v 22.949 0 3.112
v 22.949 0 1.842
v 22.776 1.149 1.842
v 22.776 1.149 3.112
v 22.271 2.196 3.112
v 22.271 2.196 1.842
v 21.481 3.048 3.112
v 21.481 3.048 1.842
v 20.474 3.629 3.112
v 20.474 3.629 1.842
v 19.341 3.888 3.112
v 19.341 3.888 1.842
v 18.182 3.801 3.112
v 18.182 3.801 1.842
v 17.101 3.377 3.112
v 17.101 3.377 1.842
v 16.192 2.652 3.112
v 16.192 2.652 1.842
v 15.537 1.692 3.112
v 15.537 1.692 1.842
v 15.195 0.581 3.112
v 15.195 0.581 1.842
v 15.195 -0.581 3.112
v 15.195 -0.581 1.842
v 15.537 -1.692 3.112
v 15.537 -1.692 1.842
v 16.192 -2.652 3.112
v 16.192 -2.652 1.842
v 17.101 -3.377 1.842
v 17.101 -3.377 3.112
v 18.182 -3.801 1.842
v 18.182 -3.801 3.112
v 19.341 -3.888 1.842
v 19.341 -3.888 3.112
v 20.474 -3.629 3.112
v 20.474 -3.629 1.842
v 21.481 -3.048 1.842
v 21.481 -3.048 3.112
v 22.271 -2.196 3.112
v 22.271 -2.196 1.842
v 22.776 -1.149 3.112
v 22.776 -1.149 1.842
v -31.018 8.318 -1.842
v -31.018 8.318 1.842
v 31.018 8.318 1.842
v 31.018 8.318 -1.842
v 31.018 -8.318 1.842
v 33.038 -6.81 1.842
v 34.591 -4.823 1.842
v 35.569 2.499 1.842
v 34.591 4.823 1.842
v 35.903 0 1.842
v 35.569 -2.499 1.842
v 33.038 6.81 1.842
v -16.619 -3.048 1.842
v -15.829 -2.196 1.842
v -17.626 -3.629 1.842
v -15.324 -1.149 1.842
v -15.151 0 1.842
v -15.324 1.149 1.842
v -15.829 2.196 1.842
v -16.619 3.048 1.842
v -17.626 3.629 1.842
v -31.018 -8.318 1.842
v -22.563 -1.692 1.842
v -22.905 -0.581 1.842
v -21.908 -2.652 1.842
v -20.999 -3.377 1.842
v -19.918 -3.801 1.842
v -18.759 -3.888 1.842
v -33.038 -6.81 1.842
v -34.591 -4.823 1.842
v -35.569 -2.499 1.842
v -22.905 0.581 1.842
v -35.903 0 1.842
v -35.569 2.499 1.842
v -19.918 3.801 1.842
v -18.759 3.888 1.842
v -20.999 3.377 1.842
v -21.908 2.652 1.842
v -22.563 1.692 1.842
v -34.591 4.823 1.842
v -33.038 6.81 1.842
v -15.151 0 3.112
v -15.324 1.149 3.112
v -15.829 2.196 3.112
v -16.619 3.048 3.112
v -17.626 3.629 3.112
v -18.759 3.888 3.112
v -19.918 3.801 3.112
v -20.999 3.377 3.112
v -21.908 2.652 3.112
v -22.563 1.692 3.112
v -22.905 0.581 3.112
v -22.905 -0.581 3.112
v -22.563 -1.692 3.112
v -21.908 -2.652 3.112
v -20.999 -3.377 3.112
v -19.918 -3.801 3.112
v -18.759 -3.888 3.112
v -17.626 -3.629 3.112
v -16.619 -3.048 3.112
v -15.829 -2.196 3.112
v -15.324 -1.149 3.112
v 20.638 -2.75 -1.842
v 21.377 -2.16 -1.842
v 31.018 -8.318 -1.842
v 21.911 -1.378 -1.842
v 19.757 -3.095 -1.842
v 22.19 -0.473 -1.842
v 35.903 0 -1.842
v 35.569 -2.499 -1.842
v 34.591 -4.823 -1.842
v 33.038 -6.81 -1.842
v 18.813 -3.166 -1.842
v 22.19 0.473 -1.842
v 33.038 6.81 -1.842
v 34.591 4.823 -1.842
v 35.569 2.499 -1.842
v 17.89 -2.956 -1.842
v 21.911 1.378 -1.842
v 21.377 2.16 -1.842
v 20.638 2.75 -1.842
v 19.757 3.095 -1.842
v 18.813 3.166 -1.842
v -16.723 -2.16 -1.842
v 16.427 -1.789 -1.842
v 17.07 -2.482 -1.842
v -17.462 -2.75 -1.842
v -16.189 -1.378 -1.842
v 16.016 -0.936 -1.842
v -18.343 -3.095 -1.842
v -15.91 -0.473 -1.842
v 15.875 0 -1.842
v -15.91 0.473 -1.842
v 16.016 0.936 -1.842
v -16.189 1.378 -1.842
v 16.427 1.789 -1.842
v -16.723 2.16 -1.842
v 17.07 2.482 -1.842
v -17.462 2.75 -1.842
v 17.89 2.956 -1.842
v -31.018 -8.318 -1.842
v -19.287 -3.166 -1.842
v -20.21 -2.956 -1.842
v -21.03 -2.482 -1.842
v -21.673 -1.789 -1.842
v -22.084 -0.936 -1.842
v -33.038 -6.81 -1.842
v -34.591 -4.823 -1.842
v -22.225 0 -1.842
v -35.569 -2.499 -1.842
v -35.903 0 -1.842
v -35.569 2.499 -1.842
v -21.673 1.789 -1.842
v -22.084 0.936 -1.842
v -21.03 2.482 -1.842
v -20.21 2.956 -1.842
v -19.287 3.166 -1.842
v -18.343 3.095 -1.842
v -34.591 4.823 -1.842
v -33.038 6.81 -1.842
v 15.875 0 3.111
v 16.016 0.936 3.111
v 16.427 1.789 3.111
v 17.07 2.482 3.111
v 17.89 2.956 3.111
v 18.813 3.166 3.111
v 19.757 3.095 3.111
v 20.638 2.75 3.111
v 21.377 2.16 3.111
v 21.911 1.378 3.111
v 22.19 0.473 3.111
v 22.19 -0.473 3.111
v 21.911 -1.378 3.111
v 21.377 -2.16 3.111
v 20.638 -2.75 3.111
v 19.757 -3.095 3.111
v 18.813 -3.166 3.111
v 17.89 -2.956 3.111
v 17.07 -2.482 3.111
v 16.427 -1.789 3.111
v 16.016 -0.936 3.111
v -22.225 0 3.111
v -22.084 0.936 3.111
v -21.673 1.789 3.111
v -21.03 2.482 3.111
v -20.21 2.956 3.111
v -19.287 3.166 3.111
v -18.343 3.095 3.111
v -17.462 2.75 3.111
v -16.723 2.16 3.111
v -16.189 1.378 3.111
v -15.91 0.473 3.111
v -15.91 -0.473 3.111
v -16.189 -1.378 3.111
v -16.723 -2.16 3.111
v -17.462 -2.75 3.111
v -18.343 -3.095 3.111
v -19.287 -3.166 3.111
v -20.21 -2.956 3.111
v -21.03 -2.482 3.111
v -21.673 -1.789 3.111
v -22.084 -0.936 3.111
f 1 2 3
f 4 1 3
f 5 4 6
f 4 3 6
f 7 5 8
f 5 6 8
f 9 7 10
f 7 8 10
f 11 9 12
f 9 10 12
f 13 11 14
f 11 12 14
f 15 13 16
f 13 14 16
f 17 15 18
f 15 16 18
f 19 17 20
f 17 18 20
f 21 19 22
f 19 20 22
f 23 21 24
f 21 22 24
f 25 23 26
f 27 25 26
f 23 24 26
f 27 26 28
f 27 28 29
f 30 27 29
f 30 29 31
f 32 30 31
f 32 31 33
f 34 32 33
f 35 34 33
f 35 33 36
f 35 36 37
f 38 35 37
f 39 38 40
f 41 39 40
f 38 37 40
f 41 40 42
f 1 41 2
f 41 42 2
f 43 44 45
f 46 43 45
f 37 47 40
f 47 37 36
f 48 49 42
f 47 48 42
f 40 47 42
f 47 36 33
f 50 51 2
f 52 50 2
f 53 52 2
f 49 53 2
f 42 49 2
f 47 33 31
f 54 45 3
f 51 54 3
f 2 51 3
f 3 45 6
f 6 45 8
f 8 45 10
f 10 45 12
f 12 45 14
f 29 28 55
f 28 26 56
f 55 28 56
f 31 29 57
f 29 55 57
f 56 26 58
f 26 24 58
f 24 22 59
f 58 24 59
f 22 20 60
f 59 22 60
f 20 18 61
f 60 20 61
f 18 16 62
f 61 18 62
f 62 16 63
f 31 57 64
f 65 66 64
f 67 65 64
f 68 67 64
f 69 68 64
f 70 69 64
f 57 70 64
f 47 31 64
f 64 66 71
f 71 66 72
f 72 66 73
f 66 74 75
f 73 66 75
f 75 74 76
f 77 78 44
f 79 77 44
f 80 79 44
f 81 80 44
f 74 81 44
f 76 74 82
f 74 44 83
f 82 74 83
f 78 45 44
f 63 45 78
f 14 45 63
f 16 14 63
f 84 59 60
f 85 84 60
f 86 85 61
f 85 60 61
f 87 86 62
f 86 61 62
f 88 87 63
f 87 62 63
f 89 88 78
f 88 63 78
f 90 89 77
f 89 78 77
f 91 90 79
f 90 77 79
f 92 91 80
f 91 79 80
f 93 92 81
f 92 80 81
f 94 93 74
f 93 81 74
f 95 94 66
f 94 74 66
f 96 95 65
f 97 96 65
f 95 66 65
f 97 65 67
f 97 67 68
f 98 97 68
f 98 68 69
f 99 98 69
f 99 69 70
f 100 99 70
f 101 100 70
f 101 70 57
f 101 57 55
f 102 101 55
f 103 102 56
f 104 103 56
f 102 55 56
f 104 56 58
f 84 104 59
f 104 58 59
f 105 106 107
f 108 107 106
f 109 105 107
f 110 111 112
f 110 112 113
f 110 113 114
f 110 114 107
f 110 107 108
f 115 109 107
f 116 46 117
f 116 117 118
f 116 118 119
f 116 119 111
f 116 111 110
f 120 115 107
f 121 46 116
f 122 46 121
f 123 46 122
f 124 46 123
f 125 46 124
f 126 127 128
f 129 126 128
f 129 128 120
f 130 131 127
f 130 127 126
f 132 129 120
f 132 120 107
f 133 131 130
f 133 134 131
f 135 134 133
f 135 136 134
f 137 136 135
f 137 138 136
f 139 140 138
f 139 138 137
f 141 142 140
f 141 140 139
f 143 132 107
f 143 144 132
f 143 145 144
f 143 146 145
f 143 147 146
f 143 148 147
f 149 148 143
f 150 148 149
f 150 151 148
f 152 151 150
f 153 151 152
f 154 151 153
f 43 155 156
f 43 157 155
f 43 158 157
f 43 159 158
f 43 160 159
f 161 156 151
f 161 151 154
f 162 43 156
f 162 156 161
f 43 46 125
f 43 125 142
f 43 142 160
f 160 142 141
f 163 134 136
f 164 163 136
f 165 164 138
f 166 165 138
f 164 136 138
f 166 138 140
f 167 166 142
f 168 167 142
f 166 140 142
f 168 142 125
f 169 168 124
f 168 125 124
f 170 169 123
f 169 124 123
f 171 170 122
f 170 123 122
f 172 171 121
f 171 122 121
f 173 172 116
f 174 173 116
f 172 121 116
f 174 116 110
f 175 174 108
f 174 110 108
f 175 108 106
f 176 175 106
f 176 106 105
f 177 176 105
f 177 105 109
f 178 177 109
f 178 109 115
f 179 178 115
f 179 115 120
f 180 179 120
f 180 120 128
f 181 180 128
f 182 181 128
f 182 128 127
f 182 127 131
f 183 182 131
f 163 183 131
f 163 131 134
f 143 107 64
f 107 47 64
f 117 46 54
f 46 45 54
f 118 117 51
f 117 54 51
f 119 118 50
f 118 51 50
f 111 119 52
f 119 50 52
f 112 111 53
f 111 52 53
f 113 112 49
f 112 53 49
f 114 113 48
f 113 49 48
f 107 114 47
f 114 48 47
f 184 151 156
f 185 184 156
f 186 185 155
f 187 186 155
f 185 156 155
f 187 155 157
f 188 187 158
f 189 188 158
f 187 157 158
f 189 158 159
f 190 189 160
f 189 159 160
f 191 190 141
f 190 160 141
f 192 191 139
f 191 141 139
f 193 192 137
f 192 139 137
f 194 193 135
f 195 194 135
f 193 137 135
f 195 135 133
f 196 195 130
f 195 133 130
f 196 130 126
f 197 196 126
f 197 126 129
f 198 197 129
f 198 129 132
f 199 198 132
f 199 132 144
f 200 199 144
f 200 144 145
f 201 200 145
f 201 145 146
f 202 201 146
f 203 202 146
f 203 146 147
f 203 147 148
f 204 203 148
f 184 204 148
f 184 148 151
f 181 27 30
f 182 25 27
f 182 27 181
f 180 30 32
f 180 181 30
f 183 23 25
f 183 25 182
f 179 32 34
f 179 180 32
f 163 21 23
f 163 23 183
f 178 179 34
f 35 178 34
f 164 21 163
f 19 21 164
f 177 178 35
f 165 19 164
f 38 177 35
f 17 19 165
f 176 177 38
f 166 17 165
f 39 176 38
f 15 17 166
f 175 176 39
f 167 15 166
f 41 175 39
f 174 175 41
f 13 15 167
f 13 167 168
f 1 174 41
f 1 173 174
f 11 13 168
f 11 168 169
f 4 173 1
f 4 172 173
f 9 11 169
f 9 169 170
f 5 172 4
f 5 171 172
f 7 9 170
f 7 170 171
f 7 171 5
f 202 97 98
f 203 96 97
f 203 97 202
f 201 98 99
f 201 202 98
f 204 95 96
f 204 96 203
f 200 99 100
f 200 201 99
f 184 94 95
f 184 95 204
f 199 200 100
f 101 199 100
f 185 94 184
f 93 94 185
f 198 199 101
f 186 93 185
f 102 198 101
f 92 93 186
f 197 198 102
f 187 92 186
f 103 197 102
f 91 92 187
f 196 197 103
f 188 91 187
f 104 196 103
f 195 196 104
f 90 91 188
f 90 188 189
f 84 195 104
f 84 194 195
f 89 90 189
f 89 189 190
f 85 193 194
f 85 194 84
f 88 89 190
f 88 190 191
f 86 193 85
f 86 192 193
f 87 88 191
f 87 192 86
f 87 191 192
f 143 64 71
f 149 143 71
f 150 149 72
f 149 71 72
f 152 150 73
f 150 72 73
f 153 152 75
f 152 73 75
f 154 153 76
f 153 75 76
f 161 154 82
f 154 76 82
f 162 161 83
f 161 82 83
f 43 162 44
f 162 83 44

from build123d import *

# Parameters (mm, degrees)
BOSS_EXTRUDE1_DEPTH               = 1.8415
SKETCH2_R                         = 3.8989
BOSS_EXTRUDE2_DEPTH               = 1.27
F_1_4_20_TAPPED_HOLE1_D           = 5.1054
F_1_4_20_TAPPED_HOLE1_DEPTH       = 16.51
F_1_4_20_TAPPED_HOLE1_CBORE_D     = 6.35
F_1_4_20_TAPPED_HOLE1_CBORE_DEPTH = 12.7
F_1_4_20_TAPPED_HOLE1_TIP         = 1.533816902


with BuildPart() as part:
    # Sketch1 → Boss-Extrude1 (new, symmetric)
    with BuildSketch(Plane.XY):
        with BuildLine():
            Line((-31.017747277, 8.3185), (31.017747277, 8.3185))
            ThreePointArc((31.017747277, 8.3185), (35.9029, 0), (31.017747277, -8.3185))
            Line((31.017747277, -8.3185), (-31.017747277, -8.3185))
            ThreePointArc((-31.017747277, -8.3185), (-35.9029, 0), (-31.017747277, 8.3185))
        make_face()
    extrude(amount=BOSS_EXTRUDE1_DEPTH, both=True)

    # Sketch2 → Boss-Extrude2 (add)
    with BuildSketch(Plane.XY.offset(1.8415)):
        with Locations((19.05, 0)):
            Circle(SKETCH2_R)
        with Locations((-19.05, 0)):
            Circle(SKETCH2_R)
    extrude(amount=BOSS_EXTRUDE2_DEPTH)

    # 1/4-20 Tapped Hole1
    with Locations(Plane(origin=(0, 0, -1.8415), x_dir=(-1, 0, 0), z_dir=(0, 0, -1))):
        with Locations((19.05, 0), (-19.05, 0)):
            CounterBoreHole(F_1_4_20_TAPPED_HOLE1_D / 2, F_1_4_20_TAPPED_HOLE1_CBORE_D / 2, F_1_4_20_TAPPED_HOLE1_CBORE_DEPTH, depth=F_1_4_20_TAPPED_HOLE1_DEPTH)
            with Locations((0, 0, -(F_1_4_20_TAPPED_HOLE1_DEPTH + F_1_4_20_TAPPED_HOLE1_TIP / 2))):  # 118° drill point
                Cone(0, F_1_4_20_TAPPED_HOLE1_D / 2, F_1_4_20_TAPPED_HOLE1_TIP, mode=Mode.SUBTRACT)


solid = part.part
